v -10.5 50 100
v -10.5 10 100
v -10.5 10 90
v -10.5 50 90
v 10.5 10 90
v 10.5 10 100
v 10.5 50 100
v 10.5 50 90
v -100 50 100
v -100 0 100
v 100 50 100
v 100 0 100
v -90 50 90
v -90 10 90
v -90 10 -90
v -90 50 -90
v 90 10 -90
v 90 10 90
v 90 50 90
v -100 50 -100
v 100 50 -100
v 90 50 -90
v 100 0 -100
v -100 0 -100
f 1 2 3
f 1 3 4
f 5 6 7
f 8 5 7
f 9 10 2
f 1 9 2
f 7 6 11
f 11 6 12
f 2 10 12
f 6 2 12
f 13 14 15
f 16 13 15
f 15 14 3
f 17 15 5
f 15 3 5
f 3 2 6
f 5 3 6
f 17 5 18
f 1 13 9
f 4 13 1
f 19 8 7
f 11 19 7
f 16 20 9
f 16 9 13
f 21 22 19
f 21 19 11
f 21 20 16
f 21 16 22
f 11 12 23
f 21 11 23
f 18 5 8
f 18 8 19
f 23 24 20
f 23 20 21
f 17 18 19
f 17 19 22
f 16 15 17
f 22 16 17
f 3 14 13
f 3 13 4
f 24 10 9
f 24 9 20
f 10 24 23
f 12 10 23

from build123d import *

# Parameters (mm, degrees)
SKETCH1_W               = 200
SKETCH1_H               = 200
BOSS_EXTRUDE1_DEPTH     = 50
CUT_EXTRUDE1_DEPTH      = 151
CUT_EXTRUDE1_DEPTH_BACK = 40
SKETCH2_W               = 180
SKETCH2_H               = 180
SKETCH3_W               = 21
SKETCH3_H               = 40
CUT_EXTRUDE2_DEPTH      = 40


with BuildPart() as part:
    # Sketch1 → Boss-Extrude1 (new body)
    with BuildSketch(Plane(origin=(0, 0, 0), x_dir=(1, 0, 0), z_dir=(0, 1, 0))):
        Rectangle(SKETCH1_W, SKETCH1_H)
    extrude(amount=BOSS_EXTRUDE1_DEPTH)

    # Sketch2 → Cut-Extrude1 (cut, two sides: drawn at the far end of the back side and taken through both)
    with BuildSketch(Plane(origin=(0, 50, 0), x_dir=(1, 0, 0), z_dir=(0, 1, 0)).offset(-CUT_EXTRUDE1_DEPTH_BACK)):
        Rectangle(SKETCH2_W, SKETCH2_H)
    extrude(amount=CUT_EXTRUDE1_DEPTH + CUT_EXTRUDE1_DEPTH_BACK, mode=Mode.SUBTRACT)

    # Sketch3 → Cut-Extrude2 (cut)
    with BuildSketch(Plane.XY.offset(100)):
        with Locations((0, 30)):
            Rectangle(SKETCH3_W, SKETCH3_H)
    extrude(amount=-CUT_EXTRUDE2_DEPTH, mode=Mode.SUBTRACT)


solid = part.part
